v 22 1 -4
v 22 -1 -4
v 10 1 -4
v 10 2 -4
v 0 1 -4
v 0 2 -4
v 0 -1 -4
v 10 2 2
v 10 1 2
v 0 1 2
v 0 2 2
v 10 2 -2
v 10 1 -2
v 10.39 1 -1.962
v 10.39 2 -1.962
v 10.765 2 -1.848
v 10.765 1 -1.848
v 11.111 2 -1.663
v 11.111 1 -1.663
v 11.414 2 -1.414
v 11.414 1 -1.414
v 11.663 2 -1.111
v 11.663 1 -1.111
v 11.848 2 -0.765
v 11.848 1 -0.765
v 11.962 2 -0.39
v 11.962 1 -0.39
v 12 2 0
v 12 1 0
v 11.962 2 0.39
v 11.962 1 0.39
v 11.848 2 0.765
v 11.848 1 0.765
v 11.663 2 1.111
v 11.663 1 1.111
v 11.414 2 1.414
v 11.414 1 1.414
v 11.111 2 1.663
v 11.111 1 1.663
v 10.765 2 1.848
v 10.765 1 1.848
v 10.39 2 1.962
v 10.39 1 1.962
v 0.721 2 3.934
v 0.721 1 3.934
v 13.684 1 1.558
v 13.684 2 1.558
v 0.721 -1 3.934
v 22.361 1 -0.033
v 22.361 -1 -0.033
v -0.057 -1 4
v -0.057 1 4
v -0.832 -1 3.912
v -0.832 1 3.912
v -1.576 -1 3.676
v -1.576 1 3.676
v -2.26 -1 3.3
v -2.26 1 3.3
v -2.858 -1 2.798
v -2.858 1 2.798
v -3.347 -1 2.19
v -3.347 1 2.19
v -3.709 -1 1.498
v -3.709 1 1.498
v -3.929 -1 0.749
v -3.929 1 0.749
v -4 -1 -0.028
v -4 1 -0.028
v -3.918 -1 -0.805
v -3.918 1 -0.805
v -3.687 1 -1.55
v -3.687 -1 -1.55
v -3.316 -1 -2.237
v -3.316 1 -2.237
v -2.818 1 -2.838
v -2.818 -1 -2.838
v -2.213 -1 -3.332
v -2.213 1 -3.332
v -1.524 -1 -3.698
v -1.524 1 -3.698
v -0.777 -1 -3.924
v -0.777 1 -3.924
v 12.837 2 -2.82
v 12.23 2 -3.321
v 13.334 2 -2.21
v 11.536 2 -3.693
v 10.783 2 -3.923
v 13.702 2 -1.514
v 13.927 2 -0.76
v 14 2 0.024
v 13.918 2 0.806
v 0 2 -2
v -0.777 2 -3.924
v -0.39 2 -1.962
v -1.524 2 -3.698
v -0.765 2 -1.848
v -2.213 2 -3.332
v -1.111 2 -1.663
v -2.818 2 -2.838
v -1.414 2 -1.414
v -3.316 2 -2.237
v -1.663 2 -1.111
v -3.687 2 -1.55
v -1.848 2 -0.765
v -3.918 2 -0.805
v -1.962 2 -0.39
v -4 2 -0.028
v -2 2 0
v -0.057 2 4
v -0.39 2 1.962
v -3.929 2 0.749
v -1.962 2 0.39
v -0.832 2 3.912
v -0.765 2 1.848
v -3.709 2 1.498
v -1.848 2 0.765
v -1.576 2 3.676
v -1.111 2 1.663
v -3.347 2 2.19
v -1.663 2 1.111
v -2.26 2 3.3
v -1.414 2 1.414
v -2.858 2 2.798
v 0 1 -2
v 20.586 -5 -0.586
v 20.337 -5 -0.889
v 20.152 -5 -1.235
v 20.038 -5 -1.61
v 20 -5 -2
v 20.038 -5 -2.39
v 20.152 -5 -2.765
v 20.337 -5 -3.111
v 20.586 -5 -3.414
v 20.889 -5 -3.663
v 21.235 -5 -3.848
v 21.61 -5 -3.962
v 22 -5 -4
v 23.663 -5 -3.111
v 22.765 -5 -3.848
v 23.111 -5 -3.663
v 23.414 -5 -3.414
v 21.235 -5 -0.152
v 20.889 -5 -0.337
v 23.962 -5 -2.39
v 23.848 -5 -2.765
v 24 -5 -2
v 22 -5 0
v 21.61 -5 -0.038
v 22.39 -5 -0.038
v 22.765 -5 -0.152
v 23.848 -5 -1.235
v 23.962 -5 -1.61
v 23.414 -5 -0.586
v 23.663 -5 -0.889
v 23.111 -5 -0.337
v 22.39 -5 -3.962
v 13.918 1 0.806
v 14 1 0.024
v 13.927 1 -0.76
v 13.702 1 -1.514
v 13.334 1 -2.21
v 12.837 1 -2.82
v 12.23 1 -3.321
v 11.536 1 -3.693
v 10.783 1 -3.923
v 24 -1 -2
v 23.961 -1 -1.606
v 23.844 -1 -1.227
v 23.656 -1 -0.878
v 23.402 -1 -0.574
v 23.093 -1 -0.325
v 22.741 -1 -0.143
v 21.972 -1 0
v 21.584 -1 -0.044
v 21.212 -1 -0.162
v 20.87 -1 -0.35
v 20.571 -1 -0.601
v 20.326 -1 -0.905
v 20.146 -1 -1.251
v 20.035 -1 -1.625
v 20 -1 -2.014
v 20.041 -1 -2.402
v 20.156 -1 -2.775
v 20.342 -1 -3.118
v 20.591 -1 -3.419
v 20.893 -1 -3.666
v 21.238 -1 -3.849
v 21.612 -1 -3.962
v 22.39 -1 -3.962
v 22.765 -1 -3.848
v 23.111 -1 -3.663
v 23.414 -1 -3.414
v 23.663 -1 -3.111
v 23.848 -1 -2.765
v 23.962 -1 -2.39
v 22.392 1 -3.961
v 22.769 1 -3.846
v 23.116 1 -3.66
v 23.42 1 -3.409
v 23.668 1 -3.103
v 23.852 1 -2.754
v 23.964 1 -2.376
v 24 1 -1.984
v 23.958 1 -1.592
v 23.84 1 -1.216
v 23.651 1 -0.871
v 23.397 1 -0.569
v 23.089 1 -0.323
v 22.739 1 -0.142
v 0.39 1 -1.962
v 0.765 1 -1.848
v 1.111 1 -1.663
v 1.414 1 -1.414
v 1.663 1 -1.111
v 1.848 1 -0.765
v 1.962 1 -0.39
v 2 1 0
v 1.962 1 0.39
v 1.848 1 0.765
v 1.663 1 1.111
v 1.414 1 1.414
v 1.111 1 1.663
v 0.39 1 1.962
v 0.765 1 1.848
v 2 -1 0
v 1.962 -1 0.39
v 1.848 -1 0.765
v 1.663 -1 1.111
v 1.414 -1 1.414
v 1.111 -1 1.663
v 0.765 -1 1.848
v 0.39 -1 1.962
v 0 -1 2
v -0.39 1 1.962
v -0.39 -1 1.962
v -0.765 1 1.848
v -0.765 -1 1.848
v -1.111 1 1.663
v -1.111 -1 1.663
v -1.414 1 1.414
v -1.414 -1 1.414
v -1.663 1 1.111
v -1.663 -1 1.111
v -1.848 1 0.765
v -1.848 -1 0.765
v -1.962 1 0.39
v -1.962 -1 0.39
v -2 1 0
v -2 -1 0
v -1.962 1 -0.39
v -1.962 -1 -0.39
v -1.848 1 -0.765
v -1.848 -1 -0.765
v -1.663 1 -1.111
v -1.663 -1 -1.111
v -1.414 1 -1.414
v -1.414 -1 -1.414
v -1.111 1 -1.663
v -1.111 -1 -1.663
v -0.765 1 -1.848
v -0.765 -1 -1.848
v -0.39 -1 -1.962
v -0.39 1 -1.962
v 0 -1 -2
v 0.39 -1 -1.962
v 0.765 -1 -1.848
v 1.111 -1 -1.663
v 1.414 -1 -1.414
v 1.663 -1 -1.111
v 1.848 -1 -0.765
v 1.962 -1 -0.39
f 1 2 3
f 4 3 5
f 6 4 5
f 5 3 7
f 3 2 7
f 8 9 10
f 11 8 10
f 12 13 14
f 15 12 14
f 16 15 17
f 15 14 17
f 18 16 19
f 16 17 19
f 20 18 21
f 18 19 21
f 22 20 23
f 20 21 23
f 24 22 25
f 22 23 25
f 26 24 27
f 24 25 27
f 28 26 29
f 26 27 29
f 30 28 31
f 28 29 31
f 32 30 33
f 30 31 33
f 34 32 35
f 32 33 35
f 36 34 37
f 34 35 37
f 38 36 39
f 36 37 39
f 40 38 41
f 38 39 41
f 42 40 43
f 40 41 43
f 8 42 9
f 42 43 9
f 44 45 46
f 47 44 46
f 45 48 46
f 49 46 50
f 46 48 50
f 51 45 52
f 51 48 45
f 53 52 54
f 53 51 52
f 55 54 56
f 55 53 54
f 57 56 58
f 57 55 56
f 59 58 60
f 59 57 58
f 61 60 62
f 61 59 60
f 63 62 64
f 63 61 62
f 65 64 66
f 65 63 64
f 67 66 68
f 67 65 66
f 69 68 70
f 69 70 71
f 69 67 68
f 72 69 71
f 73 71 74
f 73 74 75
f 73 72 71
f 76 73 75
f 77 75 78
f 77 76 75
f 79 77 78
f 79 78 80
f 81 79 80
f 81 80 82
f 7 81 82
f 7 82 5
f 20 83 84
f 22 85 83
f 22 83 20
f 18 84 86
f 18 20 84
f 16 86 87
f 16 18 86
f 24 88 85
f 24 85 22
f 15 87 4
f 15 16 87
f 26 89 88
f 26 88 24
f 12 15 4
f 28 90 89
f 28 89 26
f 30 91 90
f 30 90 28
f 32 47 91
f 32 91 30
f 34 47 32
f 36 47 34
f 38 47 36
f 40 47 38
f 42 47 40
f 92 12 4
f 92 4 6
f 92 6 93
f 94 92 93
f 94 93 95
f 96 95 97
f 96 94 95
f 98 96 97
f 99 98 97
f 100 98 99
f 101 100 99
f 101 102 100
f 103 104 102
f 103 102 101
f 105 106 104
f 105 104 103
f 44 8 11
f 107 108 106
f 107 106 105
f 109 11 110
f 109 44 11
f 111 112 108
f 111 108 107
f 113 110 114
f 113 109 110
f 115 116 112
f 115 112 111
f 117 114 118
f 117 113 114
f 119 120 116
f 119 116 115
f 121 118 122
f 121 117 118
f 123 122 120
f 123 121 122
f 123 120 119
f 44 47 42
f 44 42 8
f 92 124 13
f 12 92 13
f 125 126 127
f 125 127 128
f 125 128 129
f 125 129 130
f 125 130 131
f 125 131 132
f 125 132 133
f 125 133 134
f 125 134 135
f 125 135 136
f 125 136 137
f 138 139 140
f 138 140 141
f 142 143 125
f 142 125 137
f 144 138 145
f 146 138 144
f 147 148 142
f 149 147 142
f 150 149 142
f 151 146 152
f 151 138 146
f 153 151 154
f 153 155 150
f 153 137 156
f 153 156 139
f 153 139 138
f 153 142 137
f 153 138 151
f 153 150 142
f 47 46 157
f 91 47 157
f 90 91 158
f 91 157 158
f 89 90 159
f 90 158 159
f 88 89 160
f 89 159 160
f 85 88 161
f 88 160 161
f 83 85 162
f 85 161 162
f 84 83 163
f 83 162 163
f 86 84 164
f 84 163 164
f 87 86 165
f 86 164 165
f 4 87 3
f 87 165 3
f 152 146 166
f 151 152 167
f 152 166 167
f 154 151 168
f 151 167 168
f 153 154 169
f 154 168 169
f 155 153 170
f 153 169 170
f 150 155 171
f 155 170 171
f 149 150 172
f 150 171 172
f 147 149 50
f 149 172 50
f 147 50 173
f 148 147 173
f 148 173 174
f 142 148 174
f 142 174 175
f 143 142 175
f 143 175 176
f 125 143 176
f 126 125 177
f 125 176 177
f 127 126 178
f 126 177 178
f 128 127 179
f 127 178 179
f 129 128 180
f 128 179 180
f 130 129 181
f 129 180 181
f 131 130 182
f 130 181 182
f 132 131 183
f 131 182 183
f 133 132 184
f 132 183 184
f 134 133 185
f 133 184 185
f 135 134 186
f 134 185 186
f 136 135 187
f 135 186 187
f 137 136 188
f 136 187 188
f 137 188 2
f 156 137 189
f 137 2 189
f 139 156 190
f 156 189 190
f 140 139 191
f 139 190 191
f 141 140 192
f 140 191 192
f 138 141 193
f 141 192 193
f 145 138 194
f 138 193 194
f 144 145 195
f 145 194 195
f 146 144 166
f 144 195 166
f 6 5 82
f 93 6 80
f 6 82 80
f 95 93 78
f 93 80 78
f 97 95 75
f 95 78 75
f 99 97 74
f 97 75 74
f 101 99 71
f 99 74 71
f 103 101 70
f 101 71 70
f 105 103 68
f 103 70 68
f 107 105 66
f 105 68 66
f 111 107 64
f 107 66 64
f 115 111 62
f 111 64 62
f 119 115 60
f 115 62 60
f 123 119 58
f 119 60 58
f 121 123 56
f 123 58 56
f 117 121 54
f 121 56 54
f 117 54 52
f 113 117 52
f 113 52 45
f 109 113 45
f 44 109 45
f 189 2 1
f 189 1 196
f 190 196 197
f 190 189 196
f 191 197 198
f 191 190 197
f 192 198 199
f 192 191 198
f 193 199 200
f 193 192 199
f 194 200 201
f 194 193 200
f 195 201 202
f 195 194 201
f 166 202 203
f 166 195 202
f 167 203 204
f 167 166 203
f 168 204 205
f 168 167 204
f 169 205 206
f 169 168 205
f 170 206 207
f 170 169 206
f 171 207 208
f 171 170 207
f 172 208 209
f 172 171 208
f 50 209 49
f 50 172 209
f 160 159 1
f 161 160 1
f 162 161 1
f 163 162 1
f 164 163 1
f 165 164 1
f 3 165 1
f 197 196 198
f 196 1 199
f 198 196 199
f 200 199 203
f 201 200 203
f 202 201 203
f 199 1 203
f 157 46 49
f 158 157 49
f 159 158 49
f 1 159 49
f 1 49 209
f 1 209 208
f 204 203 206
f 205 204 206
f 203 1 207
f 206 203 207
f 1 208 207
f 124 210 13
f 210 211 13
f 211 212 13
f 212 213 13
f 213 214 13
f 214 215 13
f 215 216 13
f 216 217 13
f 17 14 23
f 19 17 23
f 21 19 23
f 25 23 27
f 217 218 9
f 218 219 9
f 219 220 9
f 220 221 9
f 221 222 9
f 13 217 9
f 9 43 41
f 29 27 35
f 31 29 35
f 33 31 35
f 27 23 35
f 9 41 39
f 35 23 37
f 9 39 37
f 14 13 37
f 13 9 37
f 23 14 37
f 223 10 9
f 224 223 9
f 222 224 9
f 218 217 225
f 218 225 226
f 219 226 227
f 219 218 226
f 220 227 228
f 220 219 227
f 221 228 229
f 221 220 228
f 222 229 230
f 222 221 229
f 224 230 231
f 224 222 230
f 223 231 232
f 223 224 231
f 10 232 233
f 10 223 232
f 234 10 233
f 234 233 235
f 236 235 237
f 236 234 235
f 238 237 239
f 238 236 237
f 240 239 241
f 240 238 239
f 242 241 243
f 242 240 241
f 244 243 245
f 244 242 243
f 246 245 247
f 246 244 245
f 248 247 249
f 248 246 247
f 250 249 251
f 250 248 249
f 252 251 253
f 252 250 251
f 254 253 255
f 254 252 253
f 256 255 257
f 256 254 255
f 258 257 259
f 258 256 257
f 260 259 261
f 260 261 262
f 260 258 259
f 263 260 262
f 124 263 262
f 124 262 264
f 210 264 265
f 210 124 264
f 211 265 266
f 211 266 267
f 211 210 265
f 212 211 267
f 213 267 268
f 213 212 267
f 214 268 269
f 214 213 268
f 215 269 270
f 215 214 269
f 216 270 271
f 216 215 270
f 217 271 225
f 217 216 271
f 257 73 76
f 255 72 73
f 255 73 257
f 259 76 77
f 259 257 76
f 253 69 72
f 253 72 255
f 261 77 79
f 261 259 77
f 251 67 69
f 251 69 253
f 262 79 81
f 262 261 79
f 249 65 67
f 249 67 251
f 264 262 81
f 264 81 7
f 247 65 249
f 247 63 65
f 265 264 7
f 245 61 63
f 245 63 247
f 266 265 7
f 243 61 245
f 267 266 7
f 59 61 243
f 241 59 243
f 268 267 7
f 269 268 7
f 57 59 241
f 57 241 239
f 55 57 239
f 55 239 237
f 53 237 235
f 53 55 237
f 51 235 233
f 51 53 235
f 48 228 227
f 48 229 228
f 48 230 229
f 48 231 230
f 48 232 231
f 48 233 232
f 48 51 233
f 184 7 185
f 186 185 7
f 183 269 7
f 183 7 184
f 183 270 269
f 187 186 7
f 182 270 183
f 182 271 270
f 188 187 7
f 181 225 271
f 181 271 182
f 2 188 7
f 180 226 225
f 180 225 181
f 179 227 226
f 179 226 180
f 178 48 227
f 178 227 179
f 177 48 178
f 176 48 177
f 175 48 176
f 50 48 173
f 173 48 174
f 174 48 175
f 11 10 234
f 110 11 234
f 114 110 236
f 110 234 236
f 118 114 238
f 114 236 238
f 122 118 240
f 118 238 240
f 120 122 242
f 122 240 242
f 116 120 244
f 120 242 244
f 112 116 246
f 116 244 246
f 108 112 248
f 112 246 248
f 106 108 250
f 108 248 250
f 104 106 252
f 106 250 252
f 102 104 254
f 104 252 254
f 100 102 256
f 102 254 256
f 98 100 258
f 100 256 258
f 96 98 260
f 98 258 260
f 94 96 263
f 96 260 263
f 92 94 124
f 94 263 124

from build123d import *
from build123d import SkipClean  # not in build123d's __all__

# Parameters (mm, degrees)
F0_R     = 2
F1_DEPTH = 1
F2_R     = 2
F3_DEPTH = 4
F5_DEPTH = 1


# Not quite as in the source:
# - after a boolean that leaves OpenCascade's solid faulty, fix() repairs it


with BuildPart() as f1:
    # F0 (on Front) → F1 (new body, symmetric)
    with BuildSketch(Plane.XZ):
        with BuildLine():
            ThreePointArc((0.7213114754, 3.9344262295), (-3.9835728259, 0.3621429842), (0, -4))
            Line((0, -4), (22, -4))
            ThreePointArc((22, -4), (23.9917864129, -2.1810714921), (22.3606557377, -0.0327868852))
            Line((22.3606557377, -0.0327868852), (0.7213114754, 3.9344262295))
        make_face()
        Circle(F0_R, mode=Mode.SUBTRACT)
    extrude(amount=F1_DEPTH, both=True)

    # F2 (on face) → F3 (join)
    with BuildSketch(Plane.XZ.offset(1)):
        with Locations((22, -2)):
            Circle(F2_R)
    with SkipClean():  # cleaning this boolean's faces spoils the solid; the shape is the same uncleaned
        extrude(amount=F3_DEPTH)

    # F4 (on face) → F5 (join)
    with BuildSketch(Plane(origin=(0, 1, 0), x_dir=(-1, 0, 0), z_dir=(0, 1, 0))):
        with BuildLine():
            Line((-0.7213114754, 3.9344262295), (-13.6841453203, 1.5579066913))
            ThreePointArc((-13.6841453203, 1.5579066913), (-13.3340385994, -2.2100195966), (-10, -4))
            Line((-10, -4), (0, -4))
            ThreePointArc((0, -4), (3.9835728259, 0.3621429842), (-0.7213114754, 3.9344262295))
        make_face()
        with BuildLine():
            ThreePointArc((0, 2), (2, 0), (0, -2))
            Line((0, -2), (-10, -2))
            ThreePointArc((-10, -2), (-12, 0), (-10, 2))
            Line((-10, 2), (0, 2))
        make_face(mode=Mode.SUBTRACT)
    extrude(amount=F5_DEPTH)

    add(f1.part.fix(), mode=Mode.REPLACE)


solid = f1.part
